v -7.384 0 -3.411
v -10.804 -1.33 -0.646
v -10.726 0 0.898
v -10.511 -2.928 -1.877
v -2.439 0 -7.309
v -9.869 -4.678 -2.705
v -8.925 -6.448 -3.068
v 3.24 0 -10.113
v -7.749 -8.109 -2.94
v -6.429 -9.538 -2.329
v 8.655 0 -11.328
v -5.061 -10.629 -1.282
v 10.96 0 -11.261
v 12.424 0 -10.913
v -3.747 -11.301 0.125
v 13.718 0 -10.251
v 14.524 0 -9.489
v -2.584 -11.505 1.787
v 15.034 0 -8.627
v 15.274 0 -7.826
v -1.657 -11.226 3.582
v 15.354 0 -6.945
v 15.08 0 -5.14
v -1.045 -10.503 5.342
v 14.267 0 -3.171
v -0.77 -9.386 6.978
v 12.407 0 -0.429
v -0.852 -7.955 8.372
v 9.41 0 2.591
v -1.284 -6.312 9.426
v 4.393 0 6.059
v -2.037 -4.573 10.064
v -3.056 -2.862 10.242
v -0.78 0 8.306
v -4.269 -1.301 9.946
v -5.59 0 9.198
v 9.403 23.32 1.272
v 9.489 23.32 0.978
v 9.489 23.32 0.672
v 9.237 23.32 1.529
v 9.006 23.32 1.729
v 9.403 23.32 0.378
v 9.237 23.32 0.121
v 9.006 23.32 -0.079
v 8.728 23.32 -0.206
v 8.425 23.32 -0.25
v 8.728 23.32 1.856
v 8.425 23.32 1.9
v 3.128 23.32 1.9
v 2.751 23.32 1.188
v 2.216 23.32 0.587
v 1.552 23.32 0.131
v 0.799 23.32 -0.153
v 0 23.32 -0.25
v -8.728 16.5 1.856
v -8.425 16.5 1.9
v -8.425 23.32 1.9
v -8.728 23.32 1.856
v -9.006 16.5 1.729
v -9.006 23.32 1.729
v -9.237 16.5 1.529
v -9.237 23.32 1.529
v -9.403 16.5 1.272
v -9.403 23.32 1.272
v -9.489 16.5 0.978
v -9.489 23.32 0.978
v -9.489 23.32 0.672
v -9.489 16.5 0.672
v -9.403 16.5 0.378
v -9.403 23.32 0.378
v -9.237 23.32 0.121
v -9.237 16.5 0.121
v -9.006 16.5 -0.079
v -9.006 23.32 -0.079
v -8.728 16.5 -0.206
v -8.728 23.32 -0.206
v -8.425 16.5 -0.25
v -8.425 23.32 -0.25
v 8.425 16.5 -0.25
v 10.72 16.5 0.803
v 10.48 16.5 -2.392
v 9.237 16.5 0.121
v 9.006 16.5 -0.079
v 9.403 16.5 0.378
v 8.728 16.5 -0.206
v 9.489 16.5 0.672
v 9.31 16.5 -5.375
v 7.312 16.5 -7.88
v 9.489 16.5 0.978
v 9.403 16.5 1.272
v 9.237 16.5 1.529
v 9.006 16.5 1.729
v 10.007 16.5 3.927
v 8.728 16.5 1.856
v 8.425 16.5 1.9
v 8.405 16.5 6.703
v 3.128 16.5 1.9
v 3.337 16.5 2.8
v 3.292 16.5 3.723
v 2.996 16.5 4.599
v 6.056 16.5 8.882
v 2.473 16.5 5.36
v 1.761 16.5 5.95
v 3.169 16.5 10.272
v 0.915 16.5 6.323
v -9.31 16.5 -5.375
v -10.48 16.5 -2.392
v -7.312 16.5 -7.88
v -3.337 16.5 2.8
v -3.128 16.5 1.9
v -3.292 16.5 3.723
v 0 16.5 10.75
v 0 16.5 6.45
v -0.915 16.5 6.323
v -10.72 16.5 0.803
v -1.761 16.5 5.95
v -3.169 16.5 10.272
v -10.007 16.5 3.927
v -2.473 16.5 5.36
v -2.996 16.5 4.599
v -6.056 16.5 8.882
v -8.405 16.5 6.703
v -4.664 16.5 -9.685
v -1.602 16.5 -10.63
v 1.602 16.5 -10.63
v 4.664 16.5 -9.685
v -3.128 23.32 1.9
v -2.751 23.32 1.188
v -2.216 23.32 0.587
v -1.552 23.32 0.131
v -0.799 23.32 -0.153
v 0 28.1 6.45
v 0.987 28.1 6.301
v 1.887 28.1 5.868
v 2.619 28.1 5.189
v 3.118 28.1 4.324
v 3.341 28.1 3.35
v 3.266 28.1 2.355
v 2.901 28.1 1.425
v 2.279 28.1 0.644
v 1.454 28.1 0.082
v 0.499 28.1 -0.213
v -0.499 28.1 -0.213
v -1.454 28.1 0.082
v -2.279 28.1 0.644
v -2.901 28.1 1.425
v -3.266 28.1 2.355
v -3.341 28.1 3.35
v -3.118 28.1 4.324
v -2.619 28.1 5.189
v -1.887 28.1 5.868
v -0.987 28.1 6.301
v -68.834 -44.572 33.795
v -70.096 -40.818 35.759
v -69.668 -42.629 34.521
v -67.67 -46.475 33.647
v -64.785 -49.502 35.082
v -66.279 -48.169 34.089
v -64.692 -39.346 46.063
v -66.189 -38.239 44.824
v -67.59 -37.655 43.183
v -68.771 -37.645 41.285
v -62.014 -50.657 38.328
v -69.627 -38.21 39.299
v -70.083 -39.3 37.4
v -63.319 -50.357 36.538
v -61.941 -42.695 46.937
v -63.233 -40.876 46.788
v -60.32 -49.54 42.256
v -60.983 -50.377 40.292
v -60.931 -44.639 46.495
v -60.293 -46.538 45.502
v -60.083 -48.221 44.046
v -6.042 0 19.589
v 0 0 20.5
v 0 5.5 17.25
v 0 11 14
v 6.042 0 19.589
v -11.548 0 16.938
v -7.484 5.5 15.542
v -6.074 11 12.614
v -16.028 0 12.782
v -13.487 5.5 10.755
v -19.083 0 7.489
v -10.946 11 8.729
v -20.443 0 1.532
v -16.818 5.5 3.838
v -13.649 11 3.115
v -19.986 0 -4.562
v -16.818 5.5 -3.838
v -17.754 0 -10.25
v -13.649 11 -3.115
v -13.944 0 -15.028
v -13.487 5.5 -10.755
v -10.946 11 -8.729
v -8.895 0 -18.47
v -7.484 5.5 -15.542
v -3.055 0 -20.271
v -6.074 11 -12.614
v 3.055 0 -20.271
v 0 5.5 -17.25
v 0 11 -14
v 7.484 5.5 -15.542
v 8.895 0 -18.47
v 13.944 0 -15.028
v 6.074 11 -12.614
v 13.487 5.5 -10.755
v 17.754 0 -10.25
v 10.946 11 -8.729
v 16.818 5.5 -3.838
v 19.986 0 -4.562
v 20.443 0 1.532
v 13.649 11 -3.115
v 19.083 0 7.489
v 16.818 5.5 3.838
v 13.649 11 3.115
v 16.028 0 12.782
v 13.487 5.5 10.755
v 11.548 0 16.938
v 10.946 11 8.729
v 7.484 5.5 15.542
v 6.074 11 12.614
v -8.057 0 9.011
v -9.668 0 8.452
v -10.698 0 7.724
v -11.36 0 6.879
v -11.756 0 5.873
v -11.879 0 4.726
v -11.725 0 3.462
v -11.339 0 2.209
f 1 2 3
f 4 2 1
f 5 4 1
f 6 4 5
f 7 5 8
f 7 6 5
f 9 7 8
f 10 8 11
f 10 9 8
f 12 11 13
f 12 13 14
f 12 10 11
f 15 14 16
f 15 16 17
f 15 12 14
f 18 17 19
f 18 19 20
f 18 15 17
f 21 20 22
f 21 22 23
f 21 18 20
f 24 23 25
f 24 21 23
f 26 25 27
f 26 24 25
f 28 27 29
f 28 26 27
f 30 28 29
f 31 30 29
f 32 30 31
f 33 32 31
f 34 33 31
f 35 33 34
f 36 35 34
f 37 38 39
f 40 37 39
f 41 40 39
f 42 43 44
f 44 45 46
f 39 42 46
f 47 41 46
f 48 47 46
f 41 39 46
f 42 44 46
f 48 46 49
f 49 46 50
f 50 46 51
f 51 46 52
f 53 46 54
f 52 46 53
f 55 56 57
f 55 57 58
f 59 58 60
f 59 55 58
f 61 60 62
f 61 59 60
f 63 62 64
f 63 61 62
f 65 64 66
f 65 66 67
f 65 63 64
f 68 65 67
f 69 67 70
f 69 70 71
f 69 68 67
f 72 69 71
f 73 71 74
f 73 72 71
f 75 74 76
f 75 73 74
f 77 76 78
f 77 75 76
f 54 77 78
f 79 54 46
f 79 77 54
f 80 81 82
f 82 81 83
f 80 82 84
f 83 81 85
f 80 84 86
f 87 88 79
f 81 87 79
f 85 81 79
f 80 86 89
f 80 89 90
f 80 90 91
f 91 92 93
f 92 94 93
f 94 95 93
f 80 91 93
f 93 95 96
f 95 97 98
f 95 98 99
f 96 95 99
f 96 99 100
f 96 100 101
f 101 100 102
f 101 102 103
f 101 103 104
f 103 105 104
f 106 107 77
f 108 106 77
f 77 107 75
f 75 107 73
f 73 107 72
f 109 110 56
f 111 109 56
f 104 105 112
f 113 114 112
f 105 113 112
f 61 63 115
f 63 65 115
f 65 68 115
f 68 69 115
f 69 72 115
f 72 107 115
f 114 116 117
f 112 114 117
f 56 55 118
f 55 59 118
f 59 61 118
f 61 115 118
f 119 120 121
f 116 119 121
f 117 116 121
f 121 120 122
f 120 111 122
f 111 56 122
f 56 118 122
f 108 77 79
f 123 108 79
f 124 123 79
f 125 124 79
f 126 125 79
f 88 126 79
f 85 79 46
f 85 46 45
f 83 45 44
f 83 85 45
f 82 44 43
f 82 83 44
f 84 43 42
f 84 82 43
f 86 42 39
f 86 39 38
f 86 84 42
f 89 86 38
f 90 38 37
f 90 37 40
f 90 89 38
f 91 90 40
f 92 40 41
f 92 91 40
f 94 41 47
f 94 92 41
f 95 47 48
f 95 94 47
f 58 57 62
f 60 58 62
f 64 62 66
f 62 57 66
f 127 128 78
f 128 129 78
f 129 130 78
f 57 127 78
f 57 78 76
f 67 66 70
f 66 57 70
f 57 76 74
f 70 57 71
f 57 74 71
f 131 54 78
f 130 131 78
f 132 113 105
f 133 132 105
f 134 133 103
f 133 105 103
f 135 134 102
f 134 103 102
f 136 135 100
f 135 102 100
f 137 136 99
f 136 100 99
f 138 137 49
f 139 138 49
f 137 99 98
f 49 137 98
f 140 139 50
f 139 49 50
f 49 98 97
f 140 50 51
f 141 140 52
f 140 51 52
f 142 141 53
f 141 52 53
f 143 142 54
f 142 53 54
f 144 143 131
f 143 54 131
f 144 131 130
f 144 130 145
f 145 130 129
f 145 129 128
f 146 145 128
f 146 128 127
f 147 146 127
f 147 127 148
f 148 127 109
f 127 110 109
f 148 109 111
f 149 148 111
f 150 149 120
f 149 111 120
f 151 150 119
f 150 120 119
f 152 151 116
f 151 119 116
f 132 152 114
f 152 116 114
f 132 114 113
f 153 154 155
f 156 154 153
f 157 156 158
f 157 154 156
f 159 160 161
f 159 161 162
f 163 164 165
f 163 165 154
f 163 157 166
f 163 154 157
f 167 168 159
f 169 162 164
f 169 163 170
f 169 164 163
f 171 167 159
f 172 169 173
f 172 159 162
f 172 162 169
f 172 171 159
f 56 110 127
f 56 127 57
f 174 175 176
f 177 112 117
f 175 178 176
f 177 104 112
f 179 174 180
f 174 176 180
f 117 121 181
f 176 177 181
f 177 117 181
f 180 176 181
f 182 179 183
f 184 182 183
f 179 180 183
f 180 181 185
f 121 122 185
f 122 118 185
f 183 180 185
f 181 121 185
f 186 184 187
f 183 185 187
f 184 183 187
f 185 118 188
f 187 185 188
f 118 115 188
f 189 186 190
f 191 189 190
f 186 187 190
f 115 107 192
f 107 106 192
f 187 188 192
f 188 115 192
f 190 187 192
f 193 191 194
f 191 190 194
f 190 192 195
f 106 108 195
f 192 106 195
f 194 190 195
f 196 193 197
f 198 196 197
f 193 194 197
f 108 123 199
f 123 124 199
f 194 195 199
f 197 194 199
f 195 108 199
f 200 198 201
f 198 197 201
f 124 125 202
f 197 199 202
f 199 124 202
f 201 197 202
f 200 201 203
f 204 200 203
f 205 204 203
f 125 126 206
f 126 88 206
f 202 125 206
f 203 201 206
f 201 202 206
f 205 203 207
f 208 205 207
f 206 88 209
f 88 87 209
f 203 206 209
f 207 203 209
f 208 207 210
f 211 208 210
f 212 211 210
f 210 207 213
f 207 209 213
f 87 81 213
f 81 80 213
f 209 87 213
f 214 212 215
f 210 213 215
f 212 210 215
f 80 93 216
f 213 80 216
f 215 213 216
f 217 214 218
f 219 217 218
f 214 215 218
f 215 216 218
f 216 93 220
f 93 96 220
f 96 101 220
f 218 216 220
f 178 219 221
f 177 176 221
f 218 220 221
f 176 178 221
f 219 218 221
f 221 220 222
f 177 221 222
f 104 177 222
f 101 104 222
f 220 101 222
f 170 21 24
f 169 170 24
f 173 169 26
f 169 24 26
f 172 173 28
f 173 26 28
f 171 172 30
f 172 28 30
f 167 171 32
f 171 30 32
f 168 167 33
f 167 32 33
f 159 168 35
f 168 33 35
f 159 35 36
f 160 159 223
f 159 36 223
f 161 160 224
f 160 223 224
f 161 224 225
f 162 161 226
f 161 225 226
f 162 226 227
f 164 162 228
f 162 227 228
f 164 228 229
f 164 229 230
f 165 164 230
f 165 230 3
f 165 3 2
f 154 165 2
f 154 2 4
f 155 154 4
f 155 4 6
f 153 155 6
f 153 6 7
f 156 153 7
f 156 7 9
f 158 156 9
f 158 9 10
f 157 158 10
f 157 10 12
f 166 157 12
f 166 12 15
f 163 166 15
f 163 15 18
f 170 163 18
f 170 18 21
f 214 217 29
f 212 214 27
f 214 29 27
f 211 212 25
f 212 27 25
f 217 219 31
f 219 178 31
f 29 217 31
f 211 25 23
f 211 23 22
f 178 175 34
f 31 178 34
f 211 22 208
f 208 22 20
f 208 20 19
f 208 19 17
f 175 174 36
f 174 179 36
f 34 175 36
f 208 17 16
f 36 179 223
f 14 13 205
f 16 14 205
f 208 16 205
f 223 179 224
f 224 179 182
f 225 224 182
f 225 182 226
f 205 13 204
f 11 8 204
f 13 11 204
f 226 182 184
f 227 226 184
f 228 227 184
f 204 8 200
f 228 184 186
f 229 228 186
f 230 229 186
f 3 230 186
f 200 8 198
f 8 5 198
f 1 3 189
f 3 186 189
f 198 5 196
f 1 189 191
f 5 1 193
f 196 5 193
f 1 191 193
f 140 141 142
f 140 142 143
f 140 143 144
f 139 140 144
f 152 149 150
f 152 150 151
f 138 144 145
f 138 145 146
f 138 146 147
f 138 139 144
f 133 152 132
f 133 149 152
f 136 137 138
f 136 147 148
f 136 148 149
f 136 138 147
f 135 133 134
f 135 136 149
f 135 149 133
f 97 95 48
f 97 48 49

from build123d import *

# Parameters (mm, degrees)
SKETCH2_R                       = 3.35
BOSS_EXTRUDE1_DEPTH             = 11.6
BOSS_EXTRUDE2_DEPTH             = 6.82
SKETCH8_R                       = 7.5
BOSS_EXTRUDE3_DEPTH             = 80
BOSS_EXTRUDE3_DIRECTION_2_REACH = 50.394


with BuildPart() as part:
    # Sketch1 → Revolve1 (revolve)
    with BuildSketch(Plane(origin=(0, 0, 0), x_dir=(0, 0, -1), z_dir=(1, 0, 0)), mode=Mode.PRIVATE) as revolve1_sk:
        Polygon((0, 16.5), (0, 0), (20.5, 0), (10.75, 16.5), align=None)
    revolve(revolve1_sk.sketch.rotate(Axis((0, 16.5, 0), (0, -1, 0)), 180), axis=Axis((0, 16.5, 0), (0, -1, 0)))

    # Sketch2 → Boss-Extrude1 (add)
    with BuildSketch(Plane(origin=(0, 16.5, 0), x_dir=(1, 0, 0), z_dir=(0, 1, 0))):
        with Locations(Location((0, -3.1, 0), (0, 0, 270))):
            Circle(SKETCH2_R)
    extrude(amount=BOSS_EXTRUDE1_DEPTH)

    # Sketch3 → Boss-Extrude2 (add)
    with BuildSketch(Plane(origin=(0, 16.5, 0), x_dir=(1, 0, 0), z_dir=(0, 1, 0))):
        with BuildLine():
            Line((-8.425, 0.25), (8.425, 0.25))
            ThreePointArc((8.425, 0.25), (9.5, -0.825), (8.425, -1.9))
            Line((8.425, -1.9), (-8.425, -1.9))
            ThreePointArc((-8.425, -1.9), (-9.5, -0.825), (-8.425, 0.25))
        make_face()
    extrude(amount=BOSS_EXTRUDE2_DEPTH)

    # Sketch8 → Boss-Extrude3 (add)
    with BuildSketch(Plane(origin=(-6.20436158, -4.094388045, 3.839162967), x_dir=(0.5261928654830319, 0, 0.8503652558252577), z_dir=(-0.7415774099490876, -0.4893824517488441, 0.458876629360761))):
        with Locations(Location((0, -1, 0), (0, 0, 286.847482278))):
            Circle(SKETCH8_R)
    extrude(amount=BOSS_EXTRUDE3_DEPTH)

    # Sketch8 → Boss-Extrude3 direction 2 (add, up to next)
    with BuildSketch(Plane(origin=(-6.20436158, -4.094388045, 3.839162967), x_dir=(0.5261928654830319, 0, 0.8503652558252577), z_dir=(-0.7415774099490876, -0.4893824517488441, 0.458876629360761)), mode=Mode.PRIVATE) as boss_extrude3_direction_2_sk1:
        with Locations(Location((0, -1, 0), (0, 0, 286.847482278))):
            Circle(SKETCH8_R)
    boss_extrude3_direction_2_tool1 = extrude(boss_extrude3_direction_2_sk1.sketch, amount=-BOSS_EXTRUDE3_DIRECTION_2_REACH, mode=Mode.PRIVATE) - part.part
    add(boss_extrude3_direction_2_tool1.solids().sort_by_distance((-5.788208, -4.966457, 3.581653))[0])


solid = part.part
